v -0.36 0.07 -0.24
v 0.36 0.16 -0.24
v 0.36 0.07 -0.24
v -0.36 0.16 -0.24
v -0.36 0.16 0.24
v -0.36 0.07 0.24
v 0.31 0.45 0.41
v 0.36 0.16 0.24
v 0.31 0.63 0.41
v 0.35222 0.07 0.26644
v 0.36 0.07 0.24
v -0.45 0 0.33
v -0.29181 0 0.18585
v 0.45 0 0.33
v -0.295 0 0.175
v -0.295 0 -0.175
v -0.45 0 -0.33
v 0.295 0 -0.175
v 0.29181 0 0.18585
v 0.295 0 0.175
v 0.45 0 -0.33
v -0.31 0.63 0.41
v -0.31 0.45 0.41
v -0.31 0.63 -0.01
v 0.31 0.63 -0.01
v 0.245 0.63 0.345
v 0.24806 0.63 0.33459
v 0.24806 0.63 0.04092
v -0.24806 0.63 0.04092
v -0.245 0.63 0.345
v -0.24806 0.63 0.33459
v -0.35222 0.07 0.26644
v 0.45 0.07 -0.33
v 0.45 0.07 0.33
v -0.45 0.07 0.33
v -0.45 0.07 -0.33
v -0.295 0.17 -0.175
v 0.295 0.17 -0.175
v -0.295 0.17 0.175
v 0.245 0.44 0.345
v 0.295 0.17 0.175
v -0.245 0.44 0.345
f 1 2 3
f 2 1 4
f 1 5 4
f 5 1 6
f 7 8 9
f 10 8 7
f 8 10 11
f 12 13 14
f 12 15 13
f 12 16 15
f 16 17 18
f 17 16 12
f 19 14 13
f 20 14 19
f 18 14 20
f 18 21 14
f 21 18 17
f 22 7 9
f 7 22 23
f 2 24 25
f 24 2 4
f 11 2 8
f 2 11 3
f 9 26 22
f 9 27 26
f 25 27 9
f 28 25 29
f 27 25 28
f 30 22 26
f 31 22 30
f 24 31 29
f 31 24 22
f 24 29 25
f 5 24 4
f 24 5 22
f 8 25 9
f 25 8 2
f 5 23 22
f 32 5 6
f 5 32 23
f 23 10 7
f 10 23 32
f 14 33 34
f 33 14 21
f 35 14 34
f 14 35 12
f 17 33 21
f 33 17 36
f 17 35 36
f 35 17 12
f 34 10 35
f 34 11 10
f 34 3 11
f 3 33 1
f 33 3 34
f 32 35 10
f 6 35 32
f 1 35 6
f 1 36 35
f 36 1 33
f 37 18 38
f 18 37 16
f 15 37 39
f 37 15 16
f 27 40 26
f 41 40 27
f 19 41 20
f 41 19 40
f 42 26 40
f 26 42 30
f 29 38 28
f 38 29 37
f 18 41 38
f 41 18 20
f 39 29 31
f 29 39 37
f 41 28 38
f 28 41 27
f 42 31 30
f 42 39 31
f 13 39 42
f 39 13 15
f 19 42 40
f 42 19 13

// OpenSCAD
// Unit envelope throat, inlet at y=0, outlet offset toward +z.
module outer(){hull(){translate([0,.08,0]) cube([.72,.16,.48],center=true); translate([0,.54,.20]) cube([.62,.18,.42],center=true);}}
module inner(){hull(){translate([0,.07,0]) cube([.59,.20,.35],center=true); translate([0,.55,.20]) cube([.49,.22,.29],center=true);}}
module chute(){difference(){union(){outer(); translate([0,.035,0]) cube([.9,.07,.66],center=true);} inner();}}
chute();
